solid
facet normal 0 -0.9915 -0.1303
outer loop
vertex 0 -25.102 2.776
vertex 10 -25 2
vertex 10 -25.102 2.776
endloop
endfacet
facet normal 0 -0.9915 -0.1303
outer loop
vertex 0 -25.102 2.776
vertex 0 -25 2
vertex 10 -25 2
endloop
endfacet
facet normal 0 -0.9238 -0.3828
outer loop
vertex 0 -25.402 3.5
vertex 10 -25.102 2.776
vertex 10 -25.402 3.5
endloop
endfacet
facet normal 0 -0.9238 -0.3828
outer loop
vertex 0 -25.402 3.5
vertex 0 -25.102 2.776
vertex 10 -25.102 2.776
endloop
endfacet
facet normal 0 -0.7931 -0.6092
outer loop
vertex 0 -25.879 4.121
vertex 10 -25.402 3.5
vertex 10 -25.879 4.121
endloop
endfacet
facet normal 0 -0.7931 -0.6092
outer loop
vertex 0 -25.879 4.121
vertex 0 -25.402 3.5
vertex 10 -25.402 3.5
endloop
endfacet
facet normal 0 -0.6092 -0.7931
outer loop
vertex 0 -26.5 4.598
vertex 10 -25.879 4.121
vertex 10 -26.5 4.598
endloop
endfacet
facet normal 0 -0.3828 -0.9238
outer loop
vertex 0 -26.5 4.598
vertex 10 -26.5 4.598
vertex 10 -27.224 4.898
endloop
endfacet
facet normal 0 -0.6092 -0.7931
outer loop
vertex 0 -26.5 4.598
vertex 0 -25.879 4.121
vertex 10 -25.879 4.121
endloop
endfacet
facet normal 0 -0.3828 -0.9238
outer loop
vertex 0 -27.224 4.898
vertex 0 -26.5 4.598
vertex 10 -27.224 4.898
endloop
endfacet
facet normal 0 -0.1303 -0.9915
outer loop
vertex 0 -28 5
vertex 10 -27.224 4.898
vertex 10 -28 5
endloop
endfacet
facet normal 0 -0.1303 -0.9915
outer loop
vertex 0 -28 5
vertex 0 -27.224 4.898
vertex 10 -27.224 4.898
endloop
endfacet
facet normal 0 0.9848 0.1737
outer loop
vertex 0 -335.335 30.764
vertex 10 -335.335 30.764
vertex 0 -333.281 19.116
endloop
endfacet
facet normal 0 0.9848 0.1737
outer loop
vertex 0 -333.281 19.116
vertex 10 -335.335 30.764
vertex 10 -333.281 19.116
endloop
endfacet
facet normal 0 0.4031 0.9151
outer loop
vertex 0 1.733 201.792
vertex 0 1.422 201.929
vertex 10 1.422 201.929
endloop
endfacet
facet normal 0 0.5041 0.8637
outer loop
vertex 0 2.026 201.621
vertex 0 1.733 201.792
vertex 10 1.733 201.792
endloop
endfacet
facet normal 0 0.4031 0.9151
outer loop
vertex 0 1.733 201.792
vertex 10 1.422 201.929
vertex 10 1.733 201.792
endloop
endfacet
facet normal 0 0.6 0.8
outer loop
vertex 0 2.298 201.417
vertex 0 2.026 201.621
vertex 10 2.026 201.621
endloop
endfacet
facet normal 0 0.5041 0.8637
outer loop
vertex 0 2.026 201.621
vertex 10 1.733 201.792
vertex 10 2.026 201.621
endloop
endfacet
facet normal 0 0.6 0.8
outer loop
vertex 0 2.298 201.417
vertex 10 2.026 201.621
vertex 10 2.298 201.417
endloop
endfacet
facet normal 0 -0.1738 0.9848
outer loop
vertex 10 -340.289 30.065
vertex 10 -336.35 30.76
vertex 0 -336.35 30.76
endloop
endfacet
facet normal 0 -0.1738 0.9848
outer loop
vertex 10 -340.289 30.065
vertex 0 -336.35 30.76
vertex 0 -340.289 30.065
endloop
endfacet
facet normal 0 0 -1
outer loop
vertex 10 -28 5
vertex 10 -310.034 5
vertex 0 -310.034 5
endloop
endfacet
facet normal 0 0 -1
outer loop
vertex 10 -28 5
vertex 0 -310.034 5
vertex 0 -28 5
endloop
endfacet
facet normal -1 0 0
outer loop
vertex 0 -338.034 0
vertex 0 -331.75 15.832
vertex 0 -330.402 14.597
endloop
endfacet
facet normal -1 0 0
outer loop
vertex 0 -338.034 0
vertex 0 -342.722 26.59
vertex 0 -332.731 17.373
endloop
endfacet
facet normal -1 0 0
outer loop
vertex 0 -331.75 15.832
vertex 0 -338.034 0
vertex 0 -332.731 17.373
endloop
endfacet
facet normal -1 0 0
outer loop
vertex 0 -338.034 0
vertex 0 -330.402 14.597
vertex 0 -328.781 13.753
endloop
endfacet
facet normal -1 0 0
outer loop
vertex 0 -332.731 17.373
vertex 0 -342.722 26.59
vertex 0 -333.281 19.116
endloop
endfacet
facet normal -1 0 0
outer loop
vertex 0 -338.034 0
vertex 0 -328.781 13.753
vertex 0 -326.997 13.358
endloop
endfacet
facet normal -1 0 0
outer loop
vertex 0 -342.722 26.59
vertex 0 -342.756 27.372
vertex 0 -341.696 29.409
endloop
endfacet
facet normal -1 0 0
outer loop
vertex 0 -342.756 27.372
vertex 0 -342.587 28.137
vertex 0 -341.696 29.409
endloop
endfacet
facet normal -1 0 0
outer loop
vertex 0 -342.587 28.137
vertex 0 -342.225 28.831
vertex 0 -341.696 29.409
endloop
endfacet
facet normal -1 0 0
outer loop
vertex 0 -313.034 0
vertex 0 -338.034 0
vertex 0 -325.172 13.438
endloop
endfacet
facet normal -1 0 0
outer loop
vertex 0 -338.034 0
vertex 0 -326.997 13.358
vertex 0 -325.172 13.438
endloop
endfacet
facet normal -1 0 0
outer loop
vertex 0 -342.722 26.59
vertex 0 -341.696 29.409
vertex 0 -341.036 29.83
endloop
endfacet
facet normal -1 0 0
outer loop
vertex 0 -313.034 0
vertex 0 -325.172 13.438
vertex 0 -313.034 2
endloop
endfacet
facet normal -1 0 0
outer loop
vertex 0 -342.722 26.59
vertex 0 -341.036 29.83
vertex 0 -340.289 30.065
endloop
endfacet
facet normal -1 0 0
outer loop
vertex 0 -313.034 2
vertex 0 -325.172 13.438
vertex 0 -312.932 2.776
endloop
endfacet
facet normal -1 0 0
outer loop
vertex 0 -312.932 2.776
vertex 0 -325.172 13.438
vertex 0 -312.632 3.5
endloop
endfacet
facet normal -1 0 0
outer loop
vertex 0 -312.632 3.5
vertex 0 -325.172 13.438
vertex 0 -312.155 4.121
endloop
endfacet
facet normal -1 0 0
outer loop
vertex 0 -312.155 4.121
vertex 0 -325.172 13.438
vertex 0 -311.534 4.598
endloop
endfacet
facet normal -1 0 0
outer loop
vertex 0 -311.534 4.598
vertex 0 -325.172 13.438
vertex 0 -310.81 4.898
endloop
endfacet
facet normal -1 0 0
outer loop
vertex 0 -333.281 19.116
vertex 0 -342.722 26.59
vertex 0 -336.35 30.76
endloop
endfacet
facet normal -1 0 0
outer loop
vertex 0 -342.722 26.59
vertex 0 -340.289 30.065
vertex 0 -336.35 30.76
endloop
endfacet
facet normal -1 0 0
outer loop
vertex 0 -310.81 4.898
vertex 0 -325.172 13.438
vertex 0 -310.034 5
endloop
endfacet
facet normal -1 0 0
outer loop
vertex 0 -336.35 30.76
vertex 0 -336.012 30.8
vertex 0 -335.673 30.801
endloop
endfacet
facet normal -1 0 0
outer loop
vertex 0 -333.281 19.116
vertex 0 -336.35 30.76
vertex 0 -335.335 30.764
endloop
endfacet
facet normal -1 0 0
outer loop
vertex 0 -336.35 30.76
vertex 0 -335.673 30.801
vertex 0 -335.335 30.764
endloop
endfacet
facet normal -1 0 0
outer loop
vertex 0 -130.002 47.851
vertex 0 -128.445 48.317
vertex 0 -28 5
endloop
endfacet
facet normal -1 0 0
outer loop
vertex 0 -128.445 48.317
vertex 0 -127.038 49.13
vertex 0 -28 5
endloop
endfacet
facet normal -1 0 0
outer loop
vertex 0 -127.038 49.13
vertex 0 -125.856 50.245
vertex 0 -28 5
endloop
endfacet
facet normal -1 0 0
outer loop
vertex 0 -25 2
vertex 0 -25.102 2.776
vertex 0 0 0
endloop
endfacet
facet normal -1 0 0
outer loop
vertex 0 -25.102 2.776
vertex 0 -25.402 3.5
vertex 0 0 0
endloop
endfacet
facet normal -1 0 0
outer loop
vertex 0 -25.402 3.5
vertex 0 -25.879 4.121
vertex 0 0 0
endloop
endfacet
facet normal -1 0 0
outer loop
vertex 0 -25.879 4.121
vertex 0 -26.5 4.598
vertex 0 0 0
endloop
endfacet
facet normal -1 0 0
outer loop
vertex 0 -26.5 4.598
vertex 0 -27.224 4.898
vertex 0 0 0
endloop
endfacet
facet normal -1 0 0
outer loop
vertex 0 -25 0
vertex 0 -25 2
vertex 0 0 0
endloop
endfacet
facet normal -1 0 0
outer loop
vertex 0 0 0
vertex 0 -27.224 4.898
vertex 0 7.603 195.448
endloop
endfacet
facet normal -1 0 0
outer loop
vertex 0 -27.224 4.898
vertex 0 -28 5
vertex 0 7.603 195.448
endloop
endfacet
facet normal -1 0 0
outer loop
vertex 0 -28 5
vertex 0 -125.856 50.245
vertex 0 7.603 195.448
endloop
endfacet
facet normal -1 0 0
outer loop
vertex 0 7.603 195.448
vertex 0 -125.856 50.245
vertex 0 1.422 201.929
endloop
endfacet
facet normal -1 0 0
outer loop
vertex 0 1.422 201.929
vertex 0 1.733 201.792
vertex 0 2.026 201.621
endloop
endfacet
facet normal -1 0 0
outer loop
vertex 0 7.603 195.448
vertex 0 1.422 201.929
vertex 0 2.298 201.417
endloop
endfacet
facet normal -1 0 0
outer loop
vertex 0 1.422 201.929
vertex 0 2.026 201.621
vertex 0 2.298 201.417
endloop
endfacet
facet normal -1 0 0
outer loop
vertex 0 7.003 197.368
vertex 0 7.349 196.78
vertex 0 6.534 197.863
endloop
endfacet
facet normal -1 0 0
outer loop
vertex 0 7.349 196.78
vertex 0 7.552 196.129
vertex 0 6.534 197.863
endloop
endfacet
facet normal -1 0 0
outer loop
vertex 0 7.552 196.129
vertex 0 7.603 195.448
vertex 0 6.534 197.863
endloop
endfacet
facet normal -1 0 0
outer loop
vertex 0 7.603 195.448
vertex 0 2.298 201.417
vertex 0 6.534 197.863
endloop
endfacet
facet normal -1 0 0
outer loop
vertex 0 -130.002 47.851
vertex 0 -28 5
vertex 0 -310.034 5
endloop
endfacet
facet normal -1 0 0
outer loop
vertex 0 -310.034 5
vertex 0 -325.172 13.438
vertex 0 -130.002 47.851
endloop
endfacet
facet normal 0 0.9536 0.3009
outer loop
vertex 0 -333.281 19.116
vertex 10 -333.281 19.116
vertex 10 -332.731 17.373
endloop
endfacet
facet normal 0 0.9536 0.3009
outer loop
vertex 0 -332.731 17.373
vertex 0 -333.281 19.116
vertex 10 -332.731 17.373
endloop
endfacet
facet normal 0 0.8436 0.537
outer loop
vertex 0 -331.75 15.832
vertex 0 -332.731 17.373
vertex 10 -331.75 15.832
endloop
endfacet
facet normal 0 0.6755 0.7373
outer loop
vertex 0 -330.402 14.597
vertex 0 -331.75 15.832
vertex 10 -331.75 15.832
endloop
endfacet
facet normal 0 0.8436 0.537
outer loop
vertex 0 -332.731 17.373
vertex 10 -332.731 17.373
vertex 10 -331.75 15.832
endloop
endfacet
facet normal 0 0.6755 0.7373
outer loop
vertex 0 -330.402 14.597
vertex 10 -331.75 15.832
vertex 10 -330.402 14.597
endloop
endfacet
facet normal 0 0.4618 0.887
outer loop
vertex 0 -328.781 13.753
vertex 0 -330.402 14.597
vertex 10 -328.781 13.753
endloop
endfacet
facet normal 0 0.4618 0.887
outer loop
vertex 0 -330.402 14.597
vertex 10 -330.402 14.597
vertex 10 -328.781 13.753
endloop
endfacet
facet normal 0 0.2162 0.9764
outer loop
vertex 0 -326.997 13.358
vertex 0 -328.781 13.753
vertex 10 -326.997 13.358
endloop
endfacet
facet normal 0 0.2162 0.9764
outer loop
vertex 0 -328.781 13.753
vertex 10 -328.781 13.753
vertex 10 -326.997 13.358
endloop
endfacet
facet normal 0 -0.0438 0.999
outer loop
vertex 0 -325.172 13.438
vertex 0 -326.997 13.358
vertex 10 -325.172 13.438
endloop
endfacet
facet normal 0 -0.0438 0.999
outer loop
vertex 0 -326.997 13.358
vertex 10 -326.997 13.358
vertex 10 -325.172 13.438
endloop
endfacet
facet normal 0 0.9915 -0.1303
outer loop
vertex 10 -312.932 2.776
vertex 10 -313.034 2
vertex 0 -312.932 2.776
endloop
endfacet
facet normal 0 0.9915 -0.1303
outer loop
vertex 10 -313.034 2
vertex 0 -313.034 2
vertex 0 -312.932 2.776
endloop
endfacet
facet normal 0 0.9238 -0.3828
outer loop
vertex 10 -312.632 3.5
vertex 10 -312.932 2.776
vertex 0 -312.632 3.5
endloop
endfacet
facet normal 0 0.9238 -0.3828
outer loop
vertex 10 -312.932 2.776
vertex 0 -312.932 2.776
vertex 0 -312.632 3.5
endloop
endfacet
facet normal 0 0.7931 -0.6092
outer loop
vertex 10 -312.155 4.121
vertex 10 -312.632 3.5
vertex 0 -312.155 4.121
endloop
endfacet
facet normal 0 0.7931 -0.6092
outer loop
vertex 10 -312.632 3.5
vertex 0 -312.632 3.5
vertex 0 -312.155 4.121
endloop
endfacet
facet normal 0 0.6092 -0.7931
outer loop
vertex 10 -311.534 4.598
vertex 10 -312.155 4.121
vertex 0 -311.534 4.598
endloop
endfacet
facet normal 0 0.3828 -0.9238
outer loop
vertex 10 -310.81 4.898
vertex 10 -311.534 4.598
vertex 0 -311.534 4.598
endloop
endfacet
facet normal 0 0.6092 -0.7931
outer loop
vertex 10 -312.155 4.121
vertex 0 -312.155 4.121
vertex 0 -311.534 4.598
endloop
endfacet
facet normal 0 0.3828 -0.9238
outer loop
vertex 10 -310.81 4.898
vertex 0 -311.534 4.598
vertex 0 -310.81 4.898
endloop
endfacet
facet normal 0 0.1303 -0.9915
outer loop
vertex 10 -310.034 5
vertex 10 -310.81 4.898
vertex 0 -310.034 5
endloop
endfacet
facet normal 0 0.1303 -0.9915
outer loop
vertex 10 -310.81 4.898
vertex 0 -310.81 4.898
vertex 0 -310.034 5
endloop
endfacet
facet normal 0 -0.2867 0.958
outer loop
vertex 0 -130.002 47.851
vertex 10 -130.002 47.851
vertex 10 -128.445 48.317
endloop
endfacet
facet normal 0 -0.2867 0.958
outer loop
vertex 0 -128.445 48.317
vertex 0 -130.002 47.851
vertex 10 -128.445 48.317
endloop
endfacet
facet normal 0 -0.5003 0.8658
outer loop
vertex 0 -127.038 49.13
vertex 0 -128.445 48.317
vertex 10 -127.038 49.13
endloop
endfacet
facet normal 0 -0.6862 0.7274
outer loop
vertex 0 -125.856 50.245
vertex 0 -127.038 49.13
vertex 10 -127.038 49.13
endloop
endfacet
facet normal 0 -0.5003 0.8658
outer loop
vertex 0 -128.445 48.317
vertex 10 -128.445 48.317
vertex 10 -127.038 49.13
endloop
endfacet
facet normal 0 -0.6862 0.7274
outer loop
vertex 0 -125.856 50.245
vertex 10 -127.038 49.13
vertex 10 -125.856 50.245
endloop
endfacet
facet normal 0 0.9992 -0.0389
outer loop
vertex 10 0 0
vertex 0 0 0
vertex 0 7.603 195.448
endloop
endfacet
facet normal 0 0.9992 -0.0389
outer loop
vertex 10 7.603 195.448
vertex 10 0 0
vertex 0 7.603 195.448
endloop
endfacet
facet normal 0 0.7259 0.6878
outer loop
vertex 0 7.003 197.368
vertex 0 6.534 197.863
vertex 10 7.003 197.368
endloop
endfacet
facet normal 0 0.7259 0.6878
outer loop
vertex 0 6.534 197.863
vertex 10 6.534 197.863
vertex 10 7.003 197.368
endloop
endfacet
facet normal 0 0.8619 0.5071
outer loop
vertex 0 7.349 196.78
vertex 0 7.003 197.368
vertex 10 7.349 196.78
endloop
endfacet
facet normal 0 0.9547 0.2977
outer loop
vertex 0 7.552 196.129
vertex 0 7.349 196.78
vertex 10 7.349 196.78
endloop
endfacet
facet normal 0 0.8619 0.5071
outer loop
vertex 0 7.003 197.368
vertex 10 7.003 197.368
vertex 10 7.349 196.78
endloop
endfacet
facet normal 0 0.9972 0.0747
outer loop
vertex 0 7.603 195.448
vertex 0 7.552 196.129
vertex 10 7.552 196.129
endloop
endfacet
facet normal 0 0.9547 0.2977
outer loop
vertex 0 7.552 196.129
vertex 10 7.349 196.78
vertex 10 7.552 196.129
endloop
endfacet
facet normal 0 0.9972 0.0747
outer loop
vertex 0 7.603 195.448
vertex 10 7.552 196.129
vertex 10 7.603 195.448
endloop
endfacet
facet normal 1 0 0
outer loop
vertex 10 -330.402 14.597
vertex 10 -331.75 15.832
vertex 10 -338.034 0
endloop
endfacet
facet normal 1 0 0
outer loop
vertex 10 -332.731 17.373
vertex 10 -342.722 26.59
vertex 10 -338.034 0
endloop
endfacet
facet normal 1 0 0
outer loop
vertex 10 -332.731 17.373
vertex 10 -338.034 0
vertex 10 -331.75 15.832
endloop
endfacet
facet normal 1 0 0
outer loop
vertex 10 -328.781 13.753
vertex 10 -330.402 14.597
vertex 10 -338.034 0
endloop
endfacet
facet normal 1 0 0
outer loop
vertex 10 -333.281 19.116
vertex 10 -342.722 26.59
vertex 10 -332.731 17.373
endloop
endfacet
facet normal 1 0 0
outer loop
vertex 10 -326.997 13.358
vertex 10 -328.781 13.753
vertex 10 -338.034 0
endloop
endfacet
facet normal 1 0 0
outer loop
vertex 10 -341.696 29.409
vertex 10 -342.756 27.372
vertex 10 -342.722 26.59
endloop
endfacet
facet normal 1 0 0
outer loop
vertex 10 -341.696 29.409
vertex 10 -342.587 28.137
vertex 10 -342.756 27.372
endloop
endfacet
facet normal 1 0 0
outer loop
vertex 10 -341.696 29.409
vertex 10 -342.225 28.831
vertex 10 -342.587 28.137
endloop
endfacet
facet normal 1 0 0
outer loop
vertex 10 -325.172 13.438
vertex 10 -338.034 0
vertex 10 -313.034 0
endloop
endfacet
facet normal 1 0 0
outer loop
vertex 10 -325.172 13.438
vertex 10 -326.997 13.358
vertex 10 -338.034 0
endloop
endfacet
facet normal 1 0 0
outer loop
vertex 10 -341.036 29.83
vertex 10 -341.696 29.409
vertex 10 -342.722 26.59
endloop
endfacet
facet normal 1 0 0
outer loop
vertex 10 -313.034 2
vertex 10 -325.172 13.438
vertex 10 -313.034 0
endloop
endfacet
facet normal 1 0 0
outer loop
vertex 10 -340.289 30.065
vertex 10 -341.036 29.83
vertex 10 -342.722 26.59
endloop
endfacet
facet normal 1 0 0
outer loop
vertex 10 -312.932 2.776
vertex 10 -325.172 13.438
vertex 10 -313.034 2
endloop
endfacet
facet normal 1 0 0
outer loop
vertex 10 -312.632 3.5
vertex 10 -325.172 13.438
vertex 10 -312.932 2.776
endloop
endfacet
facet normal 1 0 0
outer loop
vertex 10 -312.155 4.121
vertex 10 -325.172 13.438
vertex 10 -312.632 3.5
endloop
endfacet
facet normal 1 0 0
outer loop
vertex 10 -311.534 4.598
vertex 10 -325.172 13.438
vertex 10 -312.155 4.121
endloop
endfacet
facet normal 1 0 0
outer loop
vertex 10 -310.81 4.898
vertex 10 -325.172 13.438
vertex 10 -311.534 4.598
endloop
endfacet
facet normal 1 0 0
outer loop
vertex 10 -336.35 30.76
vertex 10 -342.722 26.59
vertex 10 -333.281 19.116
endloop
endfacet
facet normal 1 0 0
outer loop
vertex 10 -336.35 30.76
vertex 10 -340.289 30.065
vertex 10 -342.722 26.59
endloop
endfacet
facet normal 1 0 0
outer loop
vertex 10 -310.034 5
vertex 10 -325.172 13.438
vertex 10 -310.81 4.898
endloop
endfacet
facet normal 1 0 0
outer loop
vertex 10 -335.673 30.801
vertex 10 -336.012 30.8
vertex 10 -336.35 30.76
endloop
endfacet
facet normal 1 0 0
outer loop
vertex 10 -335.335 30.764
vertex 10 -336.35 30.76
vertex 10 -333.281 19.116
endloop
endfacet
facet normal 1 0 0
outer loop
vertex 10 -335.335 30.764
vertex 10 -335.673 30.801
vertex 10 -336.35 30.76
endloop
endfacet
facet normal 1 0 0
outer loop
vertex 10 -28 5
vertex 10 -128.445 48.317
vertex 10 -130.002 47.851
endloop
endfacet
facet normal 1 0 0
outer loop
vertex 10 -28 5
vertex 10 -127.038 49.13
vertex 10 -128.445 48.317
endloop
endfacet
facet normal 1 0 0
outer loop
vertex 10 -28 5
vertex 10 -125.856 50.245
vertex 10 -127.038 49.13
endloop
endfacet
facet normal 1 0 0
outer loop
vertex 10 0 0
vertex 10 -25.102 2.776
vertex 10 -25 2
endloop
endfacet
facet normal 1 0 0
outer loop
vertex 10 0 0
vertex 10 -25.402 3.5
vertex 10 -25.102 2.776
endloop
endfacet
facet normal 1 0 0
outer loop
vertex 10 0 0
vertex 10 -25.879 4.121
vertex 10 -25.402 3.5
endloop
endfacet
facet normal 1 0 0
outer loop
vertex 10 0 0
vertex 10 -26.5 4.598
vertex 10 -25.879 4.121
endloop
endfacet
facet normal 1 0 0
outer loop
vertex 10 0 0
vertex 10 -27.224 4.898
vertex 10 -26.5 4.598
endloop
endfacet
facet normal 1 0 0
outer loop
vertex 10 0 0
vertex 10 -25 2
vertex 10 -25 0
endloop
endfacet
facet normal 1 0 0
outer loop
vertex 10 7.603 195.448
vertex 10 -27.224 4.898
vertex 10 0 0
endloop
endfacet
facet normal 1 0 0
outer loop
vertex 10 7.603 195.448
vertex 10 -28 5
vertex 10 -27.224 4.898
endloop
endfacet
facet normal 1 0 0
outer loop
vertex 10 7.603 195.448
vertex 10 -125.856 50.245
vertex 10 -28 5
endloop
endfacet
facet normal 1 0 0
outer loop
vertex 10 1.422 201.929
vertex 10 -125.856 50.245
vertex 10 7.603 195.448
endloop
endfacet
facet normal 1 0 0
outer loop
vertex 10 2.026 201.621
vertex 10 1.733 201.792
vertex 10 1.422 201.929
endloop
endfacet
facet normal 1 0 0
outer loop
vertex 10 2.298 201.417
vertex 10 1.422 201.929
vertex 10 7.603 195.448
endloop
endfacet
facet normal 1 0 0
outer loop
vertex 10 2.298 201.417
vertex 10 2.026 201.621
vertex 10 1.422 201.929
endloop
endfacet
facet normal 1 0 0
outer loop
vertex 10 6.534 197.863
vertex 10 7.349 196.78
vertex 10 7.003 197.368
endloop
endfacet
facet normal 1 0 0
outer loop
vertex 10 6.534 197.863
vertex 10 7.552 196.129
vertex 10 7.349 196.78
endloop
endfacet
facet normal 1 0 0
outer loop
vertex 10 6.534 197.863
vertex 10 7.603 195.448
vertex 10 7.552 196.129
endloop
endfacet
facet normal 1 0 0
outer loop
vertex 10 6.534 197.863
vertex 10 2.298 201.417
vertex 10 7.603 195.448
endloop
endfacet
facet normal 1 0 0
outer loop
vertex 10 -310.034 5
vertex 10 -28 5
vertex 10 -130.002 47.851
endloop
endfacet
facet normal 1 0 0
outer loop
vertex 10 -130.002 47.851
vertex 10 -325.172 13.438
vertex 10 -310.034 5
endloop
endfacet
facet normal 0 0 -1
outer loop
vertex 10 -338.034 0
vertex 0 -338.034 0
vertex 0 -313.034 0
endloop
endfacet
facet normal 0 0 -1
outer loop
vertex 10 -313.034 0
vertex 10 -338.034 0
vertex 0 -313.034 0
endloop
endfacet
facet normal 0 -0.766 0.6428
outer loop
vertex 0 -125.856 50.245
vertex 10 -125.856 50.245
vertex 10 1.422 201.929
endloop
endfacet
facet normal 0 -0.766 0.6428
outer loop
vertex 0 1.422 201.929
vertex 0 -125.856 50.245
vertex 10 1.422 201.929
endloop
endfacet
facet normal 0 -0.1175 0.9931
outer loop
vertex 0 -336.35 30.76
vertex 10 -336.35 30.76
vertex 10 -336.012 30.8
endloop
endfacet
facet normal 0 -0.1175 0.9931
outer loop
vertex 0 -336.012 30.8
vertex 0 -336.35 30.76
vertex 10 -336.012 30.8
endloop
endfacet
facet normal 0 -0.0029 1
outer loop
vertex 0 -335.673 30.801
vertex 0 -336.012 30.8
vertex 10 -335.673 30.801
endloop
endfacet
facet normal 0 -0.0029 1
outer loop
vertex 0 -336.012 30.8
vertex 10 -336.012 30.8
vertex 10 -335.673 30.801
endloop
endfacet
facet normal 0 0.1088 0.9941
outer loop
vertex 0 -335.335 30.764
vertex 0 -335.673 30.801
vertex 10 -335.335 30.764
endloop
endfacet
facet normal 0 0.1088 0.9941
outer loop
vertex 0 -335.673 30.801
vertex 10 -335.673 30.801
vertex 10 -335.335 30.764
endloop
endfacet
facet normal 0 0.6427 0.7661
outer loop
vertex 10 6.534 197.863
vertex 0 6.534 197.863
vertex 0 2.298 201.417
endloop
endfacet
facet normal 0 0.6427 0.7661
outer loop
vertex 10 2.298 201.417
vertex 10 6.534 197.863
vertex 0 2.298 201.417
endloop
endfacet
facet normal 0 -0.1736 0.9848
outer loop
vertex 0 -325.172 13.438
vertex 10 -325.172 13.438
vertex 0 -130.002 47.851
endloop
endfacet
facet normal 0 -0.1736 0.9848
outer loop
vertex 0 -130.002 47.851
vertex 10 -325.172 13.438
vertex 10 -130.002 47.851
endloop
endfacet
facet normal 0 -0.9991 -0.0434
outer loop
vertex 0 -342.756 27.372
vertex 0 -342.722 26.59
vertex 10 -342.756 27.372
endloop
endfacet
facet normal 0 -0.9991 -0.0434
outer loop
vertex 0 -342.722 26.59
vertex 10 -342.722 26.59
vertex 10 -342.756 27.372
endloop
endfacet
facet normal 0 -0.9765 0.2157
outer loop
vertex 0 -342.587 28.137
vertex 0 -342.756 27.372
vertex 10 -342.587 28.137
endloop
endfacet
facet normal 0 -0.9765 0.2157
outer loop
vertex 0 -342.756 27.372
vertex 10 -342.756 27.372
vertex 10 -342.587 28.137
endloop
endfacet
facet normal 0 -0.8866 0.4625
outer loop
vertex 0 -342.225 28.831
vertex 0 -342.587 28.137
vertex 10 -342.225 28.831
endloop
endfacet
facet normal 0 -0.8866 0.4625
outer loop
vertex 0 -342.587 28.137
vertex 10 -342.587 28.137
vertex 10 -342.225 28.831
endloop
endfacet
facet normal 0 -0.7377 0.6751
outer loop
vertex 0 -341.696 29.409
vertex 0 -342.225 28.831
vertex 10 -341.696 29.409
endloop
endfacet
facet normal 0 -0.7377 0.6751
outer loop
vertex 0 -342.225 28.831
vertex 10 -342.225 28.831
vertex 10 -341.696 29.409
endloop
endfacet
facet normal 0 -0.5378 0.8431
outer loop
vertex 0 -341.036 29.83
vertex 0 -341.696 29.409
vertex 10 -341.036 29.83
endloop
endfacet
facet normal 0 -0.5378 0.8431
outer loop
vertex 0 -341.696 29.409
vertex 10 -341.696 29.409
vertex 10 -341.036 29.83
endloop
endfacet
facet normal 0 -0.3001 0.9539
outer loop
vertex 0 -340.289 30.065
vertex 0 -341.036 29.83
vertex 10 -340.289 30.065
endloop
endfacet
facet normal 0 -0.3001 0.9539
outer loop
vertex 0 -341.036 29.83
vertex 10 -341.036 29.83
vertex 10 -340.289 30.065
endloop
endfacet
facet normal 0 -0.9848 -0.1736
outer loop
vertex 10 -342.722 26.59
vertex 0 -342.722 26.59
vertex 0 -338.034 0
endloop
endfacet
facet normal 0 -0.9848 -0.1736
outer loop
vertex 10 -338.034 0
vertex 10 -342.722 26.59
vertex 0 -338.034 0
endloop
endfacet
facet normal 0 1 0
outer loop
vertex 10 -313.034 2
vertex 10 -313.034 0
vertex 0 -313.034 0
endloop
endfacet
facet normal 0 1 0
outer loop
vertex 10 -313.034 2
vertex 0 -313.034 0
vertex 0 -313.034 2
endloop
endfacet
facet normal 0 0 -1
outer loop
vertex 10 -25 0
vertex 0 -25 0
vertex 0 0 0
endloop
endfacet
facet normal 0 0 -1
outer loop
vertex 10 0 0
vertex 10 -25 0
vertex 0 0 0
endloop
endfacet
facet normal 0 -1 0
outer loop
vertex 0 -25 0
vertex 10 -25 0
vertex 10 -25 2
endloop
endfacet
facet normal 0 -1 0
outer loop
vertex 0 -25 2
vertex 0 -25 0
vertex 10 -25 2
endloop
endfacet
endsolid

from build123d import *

# Parameters (mm, degrees)
F1_DEPTH = 10
F2_W     = 288.033763
F2_H     = 5
F3_DEPTH = 10.001
F4_R     = 3
F5_R     = 5
F7_DEPTH = 25


with BuildPart() as f1:
    # F0 (on Right) → F1 (new body)
    with BuildSketch(Plane.YZ):
        Polygon((-343.243208, 29.544233), (-338.033763, 0), (0, 0), (7.660444, 196.917872), (0, 203.345748), (-128.557522, 50.136859), (-330.443111, 14.538983), (-333.39513, 31.280714), align=None)
    extrude(amount=F1_DEPTH)

    # F2 (on face) → F3 (cut, through all)
    with BuildSketch(Plane.YZ.offset(10)):
        with Locations((-169.016881, 2.5)):
            Rectangle(F2_W, F2_H)
    extrude(amount=-F3_DEPTH, mode=Mode.SUBTRACT)

    # F4
    f4_edges = [f1.edges().sort_by_distance(p)[0] for p in [
        (5, 0, 203.345748),
        (5, 7.660444, 196.917872),
        (5, -25, 5),
        (5, -313.033763, 5),
        (5, -333.39513, 31.280714),
        (5, -343.243208, 29.544233),
    ]]
    fillet(f4_edges, radius=F4_R)

    # F5
    f5_edges = [f1.edges().sort_by_distance(p)[0] for p in [
        (5, -330.443111, 14.538983),
        (5, -128.557522, 50.136859),
    ]]
    fillet(f5_edges, radius=F5_R)

    # F6 (on face) → F7 (cut)
    with BuildSketch(Plane.YZ.offset(10)):
        with BuildLine():
            Line((-336.349554, 36.51854), (-333.280968, 19.115725))
            ThreePointArc((-333.280968, 19.115725), (-330.402348, 14.597198), (-325.171776, 13.437608))
            Line((-325.171776, 13.437608), (-130.002429, 47.85123))
            ThreePointArc((-130.002429, 47.85123), (-127.717966, 48.682706), (-125.855655, 50.245371))
            Line((-125.855655, 50.245371), (5.131385, 206.349646))
            Line((5.131385, 206.349646), (-336.349554, 36.51854))
        make_face()
    extrude(amount=-F7_DEPTH, mode=Mode.SUBTRACT)


solid = f1.part
